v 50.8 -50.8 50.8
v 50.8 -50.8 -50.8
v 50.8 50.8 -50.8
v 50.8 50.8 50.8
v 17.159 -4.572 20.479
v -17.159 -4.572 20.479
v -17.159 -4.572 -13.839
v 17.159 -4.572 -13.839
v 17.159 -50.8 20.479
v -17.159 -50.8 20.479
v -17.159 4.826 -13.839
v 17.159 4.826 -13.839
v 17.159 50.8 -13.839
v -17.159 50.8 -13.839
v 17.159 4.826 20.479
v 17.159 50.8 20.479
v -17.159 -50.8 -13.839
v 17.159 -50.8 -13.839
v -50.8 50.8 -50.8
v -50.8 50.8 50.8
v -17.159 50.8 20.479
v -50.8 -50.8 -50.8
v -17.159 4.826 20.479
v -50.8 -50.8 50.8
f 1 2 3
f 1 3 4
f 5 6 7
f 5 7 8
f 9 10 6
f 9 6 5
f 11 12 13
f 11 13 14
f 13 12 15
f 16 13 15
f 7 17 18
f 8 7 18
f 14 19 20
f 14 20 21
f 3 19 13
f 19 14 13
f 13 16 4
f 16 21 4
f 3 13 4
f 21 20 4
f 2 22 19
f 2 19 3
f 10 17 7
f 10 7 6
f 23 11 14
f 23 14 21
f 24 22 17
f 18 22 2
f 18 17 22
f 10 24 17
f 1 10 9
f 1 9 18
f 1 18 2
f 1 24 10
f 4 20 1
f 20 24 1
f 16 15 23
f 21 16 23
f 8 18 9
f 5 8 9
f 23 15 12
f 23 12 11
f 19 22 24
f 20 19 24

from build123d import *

# Parameters (mm, degrees)
F1_W     = 101.6
F1_H     = 101.6
F2_DEPTH = 50.8
F3_W     = 34.3186343089
F3_H     = 34.3186343089
F4_DEPTH = 46.228
F5_W     = 34.3186343089
F5_H     = 34.3186343089
F6_DEPTH = 45.974


# Not quite as in the source:
# - a variable given as a bare number and used for a length is read in inches; the dataset says mm whatever the document's units were


with BuildPart() as f2:
    # F1 (on Front) → F2 (new body, symmetric)
    with BuildSketch(Plane.XZ):
        Rectangle(F1_W, F1_H)
    extrude(amount=F2_DEPTH, both=True)

    # F3 (on face) → F4 (cut)
    with BuildSketch(Plane.XZ.offset(50.8)):
        with Locations((0, 3.3200695179)):
            Rectangle(F3_W, F3_H)
    extrude(amount=-F4_DEPTH, mode=Mode.SUBTRACT)

    # F5 (on face) → F6 (cut)
    with BuildSketch(Plane(origin=(0, 50.8, 0), x_dir=(-1, 0, 0), z_dir=(0, 1, 0))):
        with Locations((0, 3.3200695179)):
            Rectangle(F5_W, F5_H)
    extrude(amount=-F6_DEPTH, mode=Mode.SUBTRACT)


solid = f2.part
